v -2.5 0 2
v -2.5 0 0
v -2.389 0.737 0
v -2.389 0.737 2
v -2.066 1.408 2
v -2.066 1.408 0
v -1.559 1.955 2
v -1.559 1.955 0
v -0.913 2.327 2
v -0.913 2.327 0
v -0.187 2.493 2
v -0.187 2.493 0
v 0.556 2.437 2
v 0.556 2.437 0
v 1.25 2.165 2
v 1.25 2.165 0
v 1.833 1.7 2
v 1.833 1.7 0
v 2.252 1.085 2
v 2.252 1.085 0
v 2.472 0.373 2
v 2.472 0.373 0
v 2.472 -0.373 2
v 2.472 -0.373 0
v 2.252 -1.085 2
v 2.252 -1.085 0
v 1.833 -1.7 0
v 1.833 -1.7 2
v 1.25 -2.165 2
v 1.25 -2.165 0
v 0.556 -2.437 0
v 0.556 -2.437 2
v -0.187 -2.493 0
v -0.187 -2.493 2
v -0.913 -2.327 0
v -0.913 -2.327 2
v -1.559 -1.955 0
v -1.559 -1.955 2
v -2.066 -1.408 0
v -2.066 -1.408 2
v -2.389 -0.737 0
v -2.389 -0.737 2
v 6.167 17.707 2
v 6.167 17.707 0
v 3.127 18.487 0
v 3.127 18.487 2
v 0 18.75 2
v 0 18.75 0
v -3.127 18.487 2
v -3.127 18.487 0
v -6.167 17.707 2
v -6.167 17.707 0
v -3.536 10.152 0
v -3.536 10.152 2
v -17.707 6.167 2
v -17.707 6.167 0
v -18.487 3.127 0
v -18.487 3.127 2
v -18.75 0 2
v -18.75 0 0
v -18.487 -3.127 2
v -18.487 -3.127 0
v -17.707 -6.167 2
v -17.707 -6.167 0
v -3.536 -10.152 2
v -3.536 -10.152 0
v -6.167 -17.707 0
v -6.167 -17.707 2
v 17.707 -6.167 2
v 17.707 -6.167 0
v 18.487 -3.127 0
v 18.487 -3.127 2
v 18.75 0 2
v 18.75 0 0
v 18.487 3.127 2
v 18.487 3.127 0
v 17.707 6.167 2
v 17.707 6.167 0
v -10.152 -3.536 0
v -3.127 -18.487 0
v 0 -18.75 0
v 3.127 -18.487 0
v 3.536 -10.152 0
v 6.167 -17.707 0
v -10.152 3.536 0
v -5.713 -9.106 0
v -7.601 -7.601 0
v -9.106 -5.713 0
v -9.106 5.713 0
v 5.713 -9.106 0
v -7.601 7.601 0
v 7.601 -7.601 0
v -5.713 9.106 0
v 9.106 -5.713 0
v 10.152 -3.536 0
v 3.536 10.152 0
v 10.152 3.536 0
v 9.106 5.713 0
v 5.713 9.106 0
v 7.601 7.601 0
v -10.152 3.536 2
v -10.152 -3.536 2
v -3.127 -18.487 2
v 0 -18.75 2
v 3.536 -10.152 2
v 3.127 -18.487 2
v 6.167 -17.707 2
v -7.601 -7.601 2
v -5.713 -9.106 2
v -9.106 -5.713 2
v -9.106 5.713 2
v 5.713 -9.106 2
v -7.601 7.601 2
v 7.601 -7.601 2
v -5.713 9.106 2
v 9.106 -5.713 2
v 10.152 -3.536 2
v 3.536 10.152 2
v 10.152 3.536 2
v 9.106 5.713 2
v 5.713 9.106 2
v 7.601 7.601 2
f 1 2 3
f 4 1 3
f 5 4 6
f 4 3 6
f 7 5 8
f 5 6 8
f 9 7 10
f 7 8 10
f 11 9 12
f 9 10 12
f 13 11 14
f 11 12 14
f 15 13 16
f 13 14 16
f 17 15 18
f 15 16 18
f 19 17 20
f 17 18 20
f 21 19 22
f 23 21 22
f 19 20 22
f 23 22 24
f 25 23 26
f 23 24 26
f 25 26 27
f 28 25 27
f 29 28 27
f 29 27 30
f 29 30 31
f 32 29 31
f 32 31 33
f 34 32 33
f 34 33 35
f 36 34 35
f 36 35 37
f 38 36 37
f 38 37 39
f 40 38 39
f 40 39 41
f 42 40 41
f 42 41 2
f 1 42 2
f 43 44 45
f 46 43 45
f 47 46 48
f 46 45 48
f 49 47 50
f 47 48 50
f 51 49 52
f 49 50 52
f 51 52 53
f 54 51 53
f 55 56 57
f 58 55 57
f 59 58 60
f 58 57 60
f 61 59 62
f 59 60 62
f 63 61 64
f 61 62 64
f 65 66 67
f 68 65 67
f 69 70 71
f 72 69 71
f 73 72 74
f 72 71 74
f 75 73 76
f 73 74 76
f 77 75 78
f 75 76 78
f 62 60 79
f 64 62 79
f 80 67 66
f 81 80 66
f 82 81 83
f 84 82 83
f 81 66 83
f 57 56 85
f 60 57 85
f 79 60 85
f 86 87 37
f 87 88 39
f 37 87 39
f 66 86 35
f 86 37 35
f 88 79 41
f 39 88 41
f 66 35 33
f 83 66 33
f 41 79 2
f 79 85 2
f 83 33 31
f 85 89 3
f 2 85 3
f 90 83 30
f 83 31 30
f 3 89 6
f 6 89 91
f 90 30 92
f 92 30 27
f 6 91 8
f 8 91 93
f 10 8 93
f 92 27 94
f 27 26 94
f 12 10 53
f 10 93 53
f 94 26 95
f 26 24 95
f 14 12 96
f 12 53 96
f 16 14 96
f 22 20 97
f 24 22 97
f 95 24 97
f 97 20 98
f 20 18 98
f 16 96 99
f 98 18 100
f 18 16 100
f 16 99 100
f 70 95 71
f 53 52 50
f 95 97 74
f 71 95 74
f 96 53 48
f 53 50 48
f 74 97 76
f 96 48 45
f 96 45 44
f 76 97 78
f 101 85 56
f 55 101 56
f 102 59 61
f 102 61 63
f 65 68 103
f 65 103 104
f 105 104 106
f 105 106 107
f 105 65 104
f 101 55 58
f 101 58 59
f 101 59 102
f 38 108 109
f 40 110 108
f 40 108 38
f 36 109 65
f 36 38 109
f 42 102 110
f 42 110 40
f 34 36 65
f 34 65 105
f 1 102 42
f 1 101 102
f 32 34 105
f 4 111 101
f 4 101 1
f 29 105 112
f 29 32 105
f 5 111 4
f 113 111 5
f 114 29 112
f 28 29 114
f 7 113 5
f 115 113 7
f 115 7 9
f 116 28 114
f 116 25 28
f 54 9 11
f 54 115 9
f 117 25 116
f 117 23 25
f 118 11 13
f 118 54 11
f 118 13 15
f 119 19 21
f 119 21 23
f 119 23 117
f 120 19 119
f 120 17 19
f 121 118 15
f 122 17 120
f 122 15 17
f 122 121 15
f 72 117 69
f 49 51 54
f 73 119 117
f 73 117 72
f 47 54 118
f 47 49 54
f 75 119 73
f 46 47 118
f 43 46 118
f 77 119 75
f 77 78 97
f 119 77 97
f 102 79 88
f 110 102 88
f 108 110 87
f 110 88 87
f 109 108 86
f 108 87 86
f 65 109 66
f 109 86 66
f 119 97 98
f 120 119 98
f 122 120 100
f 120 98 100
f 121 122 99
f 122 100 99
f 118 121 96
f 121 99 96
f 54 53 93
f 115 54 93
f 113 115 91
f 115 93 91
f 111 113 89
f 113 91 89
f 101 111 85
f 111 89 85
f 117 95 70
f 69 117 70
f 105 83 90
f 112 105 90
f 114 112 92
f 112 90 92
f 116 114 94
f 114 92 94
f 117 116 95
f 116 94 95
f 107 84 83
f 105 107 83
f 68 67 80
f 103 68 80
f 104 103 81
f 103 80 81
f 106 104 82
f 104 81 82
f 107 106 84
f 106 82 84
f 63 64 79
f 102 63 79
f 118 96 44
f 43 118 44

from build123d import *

# Parameters (mm, degrees)
BOSS_EXTRUDE1_DEPTH = 2
SKETCH2_R           = 2.5
CUT_EXTRUDE1_DEPTH  = 27.591822051


with BuildPart() as part:
    # Sketch1 → Boss-Extrude1 (new body)
    with BuildSketch(Plane.XY):
        with BuildLine():
            Line((3.535767004, 10.15188907), (6.167035471, 17.706783262))
            ThreePointArc((6.167035471, 17.706783262), (0, 18.75), (-6.167035471, 17.706783262))
            Line((-6.167035471, 17.706783262), (-3.535767004, 10.15188907))
            ThreePointArc((-3.535767004, 10.15188907), (-7.601397898, 7.601397898), (-10.15188907, 3.535767004))
            Line((-10.15188907, 3.535767004), (-17.706783262, 6.167035471))
            ThreePointArc((-17.706783262, 6.167035471), (-18.75, 0), (-17.706783262, -6.167035471))
            Line((-17.706783262, -6.167035471), (-10.15188907, -3.535767004))
            ThreePointArc((-10.15188907, -3.535767004), (-7.601397898, -7.601397898), (-3.535767004, -10.15188907))
            Line((-3.535767004, -10.15188907), (-6.167035471, -17.706783262))
            ThreePointArc((-6.167035471, -17.706783262), (0, -18.75), (6.167035471, -17.706783262))
            Line((6.167035471, -17.706783262), (3.535767004, -10.15188907))
            ThreePointArc((3.535767004, -10.15188907), (7.601397898, -7.601397898), (10.15188907, -3.535767004))
            Line((10.15188907, -3.535767004), (17.706783262, -6.167035471))
            ThreePointArc((17.706783262, -6.167035471), (18.75, 0), (17.706783262, 6.167035471))
            Line((17.706783262, 6.167035471), (10.15188907, 3.535767004))
            ThreePointArc((10.15188907, 3.535767004), (7.601397898, 7.601397898), (3.535767004, 10.15188907))
        make_face()
    extrude(amount=BOSS_EXTRUDE1_DEPTH)

    # Sketch2 → Cut-Extrude1 (cut, through all)
    with BuildSketch(Plane(origin=(0, 0, 0), x_dir=(-1, 0, 0), z_dir=(0, 0, -1))):
        Circle(SKETCH2_R)
    extrude(amount=-CUT_EXTRUDE1_DEPTH, mode=Mode.SUBTRACT)


solid = part.part
